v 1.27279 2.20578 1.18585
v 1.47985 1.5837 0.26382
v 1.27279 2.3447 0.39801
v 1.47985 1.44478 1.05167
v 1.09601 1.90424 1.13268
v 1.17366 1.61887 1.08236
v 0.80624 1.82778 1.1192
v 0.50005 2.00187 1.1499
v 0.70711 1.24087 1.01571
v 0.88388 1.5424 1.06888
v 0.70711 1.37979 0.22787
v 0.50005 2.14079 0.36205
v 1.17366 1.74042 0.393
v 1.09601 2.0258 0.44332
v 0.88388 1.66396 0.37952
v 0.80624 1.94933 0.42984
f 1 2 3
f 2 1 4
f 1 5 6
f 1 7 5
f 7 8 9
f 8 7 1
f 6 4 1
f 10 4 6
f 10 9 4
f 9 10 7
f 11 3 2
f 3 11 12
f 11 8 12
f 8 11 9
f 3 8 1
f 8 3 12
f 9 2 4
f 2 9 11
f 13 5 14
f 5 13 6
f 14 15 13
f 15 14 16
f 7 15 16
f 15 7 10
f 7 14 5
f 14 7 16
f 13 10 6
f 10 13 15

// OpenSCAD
module key(position = [ 0, 0 ], dimensions = [ 1, 1 ]) {
    x_offset = position[0];
    y_offset = position[1];

    x_size = dimensions[0];
    y_size = dimensions[1];

    translate([ x_offset, y_offset, 0 ]) {
        difference() {
            cube([ x_size * 0.8, y_size * 0.8, 1 * 0.8 ]);
            translate([ x_size * 0.25, y_size * 0.25, 0.1 ]) {
                cube([ x_size * 0.3, y_size * 0.3, 1 * 0.9 ]);
            }
        }
    }
}

module section(rowlist, tilt_angle, rotation_angle, rotation_center) {
    translate(rot_center) {
        rotate(tilt_angle, [ 1, 0, 0 ]) {
            rotate(rot_angle, [ 0, 0, 1 ]) {
                translate(-rot_center) {
                    for (row = rowlist) {
                        for (key_arr = row) {
                            key(position = key_arr[0],
                                position = key_arr[1]);
                        }
                    }
                }
            }
        }
    }
}

section(
    rowlist =
        [
            [
                [
                    [ 0, 0 ], // row-start-relative position
                    [ 1, 1 ]  // dimensions height/width
                ],            // key 1
                [
                    [ 0, 0 ], // row-start-relative position
                    [ 1, 1 ]  // dimensions height/width
                ],            // key 2
            ],                // row 1
            [
                [
                    [ 0, 0 ], // row-start-relative position
                    [ 1, 1 ]  // dimensions height/width
                ],            // key 1
                [
                    [ 0, 0 ], // row-start-relative position
                    [ 1, 1 ]  // dimensions height/width
                ],            // key 2
            ]                 // row 2
        ],
    tilt_angle = 10,
    rot_angle  = 15,
    rot_center = [ 0, 0, 1 ]);
